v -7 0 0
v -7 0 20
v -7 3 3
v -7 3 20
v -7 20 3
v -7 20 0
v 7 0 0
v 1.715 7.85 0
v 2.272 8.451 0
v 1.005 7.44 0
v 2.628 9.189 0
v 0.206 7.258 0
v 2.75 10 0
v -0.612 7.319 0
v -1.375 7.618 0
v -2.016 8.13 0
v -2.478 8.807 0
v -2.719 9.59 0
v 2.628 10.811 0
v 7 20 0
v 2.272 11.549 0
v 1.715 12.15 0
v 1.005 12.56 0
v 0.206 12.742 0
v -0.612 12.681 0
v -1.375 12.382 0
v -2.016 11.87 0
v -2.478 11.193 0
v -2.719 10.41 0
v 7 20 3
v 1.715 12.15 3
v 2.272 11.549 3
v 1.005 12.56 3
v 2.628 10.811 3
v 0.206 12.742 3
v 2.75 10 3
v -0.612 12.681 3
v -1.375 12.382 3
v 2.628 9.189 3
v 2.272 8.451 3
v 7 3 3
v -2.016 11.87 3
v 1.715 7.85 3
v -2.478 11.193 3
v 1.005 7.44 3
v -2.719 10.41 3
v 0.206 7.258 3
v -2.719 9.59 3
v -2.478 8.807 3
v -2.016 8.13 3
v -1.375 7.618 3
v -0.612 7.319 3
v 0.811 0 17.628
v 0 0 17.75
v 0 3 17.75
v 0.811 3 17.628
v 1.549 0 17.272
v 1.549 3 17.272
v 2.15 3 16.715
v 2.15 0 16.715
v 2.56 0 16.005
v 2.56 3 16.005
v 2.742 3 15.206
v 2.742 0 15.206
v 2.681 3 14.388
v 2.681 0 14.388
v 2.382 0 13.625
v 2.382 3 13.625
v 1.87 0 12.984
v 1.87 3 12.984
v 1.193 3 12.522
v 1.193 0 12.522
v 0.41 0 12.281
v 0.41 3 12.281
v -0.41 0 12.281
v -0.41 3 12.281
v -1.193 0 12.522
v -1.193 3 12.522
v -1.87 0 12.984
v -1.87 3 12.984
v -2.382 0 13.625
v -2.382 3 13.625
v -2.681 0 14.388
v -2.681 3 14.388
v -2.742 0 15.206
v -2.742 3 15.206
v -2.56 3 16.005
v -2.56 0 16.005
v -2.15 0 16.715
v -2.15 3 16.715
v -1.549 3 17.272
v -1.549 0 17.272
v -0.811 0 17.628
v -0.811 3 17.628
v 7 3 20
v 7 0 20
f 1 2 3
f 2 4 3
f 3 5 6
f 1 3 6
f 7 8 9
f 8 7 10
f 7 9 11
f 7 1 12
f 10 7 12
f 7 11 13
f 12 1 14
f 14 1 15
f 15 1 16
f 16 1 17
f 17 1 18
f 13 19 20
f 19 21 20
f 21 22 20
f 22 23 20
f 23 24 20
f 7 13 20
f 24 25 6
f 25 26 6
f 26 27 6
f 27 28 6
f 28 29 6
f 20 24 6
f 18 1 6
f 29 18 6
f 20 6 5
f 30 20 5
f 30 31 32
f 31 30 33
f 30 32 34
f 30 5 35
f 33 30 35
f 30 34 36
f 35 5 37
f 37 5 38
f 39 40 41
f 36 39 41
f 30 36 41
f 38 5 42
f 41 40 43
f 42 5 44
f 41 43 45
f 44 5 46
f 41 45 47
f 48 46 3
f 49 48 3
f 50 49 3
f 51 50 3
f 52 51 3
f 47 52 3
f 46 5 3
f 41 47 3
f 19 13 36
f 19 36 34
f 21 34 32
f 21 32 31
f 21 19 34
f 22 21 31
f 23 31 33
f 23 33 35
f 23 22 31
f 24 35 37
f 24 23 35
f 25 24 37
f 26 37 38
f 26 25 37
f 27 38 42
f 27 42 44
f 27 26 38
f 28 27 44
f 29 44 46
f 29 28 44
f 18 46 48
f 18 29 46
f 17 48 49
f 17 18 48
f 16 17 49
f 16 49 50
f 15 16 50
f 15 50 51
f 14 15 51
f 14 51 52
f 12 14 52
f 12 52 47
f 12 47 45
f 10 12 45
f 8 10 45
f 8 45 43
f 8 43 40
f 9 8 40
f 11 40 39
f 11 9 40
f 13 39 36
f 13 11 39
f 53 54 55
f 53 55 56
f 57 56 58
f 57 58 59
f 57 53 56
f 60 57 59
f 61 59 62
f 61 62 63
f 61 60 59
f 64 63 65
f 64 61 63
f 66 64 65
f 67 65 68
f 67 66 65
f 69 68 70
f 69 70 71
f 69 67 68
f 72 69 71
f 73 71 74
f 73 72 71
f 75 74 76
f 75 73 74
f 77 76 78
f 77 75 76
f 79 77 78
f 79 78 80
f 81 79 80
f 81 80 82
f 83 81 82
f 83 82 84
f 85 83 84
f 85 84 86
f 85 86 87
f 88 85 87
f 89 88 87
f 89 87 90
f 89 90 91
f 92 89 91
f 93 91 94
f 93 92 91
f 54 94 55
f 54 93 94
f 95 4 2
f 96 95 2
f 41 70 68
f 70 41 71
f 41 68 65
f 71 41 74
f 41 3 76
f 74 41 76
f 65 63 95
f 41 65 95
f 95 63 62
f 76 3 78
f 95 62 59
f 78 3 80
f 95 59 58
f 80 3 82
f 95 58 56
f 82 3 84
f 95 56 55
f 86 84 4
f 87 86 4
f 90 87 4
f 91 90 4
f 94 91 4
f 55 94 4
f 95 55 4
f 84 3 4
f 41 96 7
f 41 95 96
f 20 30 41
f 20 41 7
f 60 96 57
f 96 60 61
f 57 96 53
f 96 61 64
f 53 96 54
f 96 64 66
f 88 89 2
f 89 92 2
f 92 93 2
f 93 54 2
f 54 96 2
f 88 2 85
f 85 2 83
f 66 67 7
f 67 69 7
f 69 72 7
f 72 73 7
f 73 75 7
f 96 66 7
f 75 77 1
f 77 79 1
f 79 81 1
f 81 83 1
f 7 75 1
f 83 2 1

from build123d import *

# Parameters (mm, degrees)
BOSS_EXTRUDE1_DEPTH      = 7
BOSS_EXTRUDE1_DEPTH_BACK = 7
SKETCH2_R                = 2.75
CUT_EXTRUDE1_DEPTH       = 3
SKETCH3_R                = 2.75
CUT_EXTRUDE2_DEPTH       = 3


with BuildPart() as part:
    # Sketch1 → Boss-Extrude1 (new, two sides: drawn at the far end of the back side and taken through both)
    with BuildSketch(Plane(origin=(0, 0, 0), x_dir=(0, 0, -1), z_dir=(1, 0, 0)).offset(-BOSS_EXTRUDE1_DEPTH_BACK)):
        Polygon((-20, 0), (0, 0), (0, 20), (-3, 20), (-3, 3), (-20, 3), align=None)
    extrude(amount=BOSS_EXTRUDE1_DEPTH + BOSS_EXTRUDE1_DEPTH_BACK)

    # Sketch2 → Cut-Extrude1 (cut)
    with BuildSketch(Plane.XY):
        with Locations((0, 10)):
            Circle(SKETCH2_R)
    extrude(amount=CUT_EXTRUDE1_DEPTH, mode=Mode.SUBTRACT)

    # Sketch3 → Cut-Extrude2 (cut)
    with BuildSketch(Plane(origin=(0, 0, 0), x_dir=(1, 0, 0), z_dir=(0, 1, 0))):
        with Locations((0, -15)):
            Circle(SKETCH3_R)
    extrude(amount=CUT_EXTRUDE2_DEPTH, mode=Mode.SUBTRACT)


solid = part.part
